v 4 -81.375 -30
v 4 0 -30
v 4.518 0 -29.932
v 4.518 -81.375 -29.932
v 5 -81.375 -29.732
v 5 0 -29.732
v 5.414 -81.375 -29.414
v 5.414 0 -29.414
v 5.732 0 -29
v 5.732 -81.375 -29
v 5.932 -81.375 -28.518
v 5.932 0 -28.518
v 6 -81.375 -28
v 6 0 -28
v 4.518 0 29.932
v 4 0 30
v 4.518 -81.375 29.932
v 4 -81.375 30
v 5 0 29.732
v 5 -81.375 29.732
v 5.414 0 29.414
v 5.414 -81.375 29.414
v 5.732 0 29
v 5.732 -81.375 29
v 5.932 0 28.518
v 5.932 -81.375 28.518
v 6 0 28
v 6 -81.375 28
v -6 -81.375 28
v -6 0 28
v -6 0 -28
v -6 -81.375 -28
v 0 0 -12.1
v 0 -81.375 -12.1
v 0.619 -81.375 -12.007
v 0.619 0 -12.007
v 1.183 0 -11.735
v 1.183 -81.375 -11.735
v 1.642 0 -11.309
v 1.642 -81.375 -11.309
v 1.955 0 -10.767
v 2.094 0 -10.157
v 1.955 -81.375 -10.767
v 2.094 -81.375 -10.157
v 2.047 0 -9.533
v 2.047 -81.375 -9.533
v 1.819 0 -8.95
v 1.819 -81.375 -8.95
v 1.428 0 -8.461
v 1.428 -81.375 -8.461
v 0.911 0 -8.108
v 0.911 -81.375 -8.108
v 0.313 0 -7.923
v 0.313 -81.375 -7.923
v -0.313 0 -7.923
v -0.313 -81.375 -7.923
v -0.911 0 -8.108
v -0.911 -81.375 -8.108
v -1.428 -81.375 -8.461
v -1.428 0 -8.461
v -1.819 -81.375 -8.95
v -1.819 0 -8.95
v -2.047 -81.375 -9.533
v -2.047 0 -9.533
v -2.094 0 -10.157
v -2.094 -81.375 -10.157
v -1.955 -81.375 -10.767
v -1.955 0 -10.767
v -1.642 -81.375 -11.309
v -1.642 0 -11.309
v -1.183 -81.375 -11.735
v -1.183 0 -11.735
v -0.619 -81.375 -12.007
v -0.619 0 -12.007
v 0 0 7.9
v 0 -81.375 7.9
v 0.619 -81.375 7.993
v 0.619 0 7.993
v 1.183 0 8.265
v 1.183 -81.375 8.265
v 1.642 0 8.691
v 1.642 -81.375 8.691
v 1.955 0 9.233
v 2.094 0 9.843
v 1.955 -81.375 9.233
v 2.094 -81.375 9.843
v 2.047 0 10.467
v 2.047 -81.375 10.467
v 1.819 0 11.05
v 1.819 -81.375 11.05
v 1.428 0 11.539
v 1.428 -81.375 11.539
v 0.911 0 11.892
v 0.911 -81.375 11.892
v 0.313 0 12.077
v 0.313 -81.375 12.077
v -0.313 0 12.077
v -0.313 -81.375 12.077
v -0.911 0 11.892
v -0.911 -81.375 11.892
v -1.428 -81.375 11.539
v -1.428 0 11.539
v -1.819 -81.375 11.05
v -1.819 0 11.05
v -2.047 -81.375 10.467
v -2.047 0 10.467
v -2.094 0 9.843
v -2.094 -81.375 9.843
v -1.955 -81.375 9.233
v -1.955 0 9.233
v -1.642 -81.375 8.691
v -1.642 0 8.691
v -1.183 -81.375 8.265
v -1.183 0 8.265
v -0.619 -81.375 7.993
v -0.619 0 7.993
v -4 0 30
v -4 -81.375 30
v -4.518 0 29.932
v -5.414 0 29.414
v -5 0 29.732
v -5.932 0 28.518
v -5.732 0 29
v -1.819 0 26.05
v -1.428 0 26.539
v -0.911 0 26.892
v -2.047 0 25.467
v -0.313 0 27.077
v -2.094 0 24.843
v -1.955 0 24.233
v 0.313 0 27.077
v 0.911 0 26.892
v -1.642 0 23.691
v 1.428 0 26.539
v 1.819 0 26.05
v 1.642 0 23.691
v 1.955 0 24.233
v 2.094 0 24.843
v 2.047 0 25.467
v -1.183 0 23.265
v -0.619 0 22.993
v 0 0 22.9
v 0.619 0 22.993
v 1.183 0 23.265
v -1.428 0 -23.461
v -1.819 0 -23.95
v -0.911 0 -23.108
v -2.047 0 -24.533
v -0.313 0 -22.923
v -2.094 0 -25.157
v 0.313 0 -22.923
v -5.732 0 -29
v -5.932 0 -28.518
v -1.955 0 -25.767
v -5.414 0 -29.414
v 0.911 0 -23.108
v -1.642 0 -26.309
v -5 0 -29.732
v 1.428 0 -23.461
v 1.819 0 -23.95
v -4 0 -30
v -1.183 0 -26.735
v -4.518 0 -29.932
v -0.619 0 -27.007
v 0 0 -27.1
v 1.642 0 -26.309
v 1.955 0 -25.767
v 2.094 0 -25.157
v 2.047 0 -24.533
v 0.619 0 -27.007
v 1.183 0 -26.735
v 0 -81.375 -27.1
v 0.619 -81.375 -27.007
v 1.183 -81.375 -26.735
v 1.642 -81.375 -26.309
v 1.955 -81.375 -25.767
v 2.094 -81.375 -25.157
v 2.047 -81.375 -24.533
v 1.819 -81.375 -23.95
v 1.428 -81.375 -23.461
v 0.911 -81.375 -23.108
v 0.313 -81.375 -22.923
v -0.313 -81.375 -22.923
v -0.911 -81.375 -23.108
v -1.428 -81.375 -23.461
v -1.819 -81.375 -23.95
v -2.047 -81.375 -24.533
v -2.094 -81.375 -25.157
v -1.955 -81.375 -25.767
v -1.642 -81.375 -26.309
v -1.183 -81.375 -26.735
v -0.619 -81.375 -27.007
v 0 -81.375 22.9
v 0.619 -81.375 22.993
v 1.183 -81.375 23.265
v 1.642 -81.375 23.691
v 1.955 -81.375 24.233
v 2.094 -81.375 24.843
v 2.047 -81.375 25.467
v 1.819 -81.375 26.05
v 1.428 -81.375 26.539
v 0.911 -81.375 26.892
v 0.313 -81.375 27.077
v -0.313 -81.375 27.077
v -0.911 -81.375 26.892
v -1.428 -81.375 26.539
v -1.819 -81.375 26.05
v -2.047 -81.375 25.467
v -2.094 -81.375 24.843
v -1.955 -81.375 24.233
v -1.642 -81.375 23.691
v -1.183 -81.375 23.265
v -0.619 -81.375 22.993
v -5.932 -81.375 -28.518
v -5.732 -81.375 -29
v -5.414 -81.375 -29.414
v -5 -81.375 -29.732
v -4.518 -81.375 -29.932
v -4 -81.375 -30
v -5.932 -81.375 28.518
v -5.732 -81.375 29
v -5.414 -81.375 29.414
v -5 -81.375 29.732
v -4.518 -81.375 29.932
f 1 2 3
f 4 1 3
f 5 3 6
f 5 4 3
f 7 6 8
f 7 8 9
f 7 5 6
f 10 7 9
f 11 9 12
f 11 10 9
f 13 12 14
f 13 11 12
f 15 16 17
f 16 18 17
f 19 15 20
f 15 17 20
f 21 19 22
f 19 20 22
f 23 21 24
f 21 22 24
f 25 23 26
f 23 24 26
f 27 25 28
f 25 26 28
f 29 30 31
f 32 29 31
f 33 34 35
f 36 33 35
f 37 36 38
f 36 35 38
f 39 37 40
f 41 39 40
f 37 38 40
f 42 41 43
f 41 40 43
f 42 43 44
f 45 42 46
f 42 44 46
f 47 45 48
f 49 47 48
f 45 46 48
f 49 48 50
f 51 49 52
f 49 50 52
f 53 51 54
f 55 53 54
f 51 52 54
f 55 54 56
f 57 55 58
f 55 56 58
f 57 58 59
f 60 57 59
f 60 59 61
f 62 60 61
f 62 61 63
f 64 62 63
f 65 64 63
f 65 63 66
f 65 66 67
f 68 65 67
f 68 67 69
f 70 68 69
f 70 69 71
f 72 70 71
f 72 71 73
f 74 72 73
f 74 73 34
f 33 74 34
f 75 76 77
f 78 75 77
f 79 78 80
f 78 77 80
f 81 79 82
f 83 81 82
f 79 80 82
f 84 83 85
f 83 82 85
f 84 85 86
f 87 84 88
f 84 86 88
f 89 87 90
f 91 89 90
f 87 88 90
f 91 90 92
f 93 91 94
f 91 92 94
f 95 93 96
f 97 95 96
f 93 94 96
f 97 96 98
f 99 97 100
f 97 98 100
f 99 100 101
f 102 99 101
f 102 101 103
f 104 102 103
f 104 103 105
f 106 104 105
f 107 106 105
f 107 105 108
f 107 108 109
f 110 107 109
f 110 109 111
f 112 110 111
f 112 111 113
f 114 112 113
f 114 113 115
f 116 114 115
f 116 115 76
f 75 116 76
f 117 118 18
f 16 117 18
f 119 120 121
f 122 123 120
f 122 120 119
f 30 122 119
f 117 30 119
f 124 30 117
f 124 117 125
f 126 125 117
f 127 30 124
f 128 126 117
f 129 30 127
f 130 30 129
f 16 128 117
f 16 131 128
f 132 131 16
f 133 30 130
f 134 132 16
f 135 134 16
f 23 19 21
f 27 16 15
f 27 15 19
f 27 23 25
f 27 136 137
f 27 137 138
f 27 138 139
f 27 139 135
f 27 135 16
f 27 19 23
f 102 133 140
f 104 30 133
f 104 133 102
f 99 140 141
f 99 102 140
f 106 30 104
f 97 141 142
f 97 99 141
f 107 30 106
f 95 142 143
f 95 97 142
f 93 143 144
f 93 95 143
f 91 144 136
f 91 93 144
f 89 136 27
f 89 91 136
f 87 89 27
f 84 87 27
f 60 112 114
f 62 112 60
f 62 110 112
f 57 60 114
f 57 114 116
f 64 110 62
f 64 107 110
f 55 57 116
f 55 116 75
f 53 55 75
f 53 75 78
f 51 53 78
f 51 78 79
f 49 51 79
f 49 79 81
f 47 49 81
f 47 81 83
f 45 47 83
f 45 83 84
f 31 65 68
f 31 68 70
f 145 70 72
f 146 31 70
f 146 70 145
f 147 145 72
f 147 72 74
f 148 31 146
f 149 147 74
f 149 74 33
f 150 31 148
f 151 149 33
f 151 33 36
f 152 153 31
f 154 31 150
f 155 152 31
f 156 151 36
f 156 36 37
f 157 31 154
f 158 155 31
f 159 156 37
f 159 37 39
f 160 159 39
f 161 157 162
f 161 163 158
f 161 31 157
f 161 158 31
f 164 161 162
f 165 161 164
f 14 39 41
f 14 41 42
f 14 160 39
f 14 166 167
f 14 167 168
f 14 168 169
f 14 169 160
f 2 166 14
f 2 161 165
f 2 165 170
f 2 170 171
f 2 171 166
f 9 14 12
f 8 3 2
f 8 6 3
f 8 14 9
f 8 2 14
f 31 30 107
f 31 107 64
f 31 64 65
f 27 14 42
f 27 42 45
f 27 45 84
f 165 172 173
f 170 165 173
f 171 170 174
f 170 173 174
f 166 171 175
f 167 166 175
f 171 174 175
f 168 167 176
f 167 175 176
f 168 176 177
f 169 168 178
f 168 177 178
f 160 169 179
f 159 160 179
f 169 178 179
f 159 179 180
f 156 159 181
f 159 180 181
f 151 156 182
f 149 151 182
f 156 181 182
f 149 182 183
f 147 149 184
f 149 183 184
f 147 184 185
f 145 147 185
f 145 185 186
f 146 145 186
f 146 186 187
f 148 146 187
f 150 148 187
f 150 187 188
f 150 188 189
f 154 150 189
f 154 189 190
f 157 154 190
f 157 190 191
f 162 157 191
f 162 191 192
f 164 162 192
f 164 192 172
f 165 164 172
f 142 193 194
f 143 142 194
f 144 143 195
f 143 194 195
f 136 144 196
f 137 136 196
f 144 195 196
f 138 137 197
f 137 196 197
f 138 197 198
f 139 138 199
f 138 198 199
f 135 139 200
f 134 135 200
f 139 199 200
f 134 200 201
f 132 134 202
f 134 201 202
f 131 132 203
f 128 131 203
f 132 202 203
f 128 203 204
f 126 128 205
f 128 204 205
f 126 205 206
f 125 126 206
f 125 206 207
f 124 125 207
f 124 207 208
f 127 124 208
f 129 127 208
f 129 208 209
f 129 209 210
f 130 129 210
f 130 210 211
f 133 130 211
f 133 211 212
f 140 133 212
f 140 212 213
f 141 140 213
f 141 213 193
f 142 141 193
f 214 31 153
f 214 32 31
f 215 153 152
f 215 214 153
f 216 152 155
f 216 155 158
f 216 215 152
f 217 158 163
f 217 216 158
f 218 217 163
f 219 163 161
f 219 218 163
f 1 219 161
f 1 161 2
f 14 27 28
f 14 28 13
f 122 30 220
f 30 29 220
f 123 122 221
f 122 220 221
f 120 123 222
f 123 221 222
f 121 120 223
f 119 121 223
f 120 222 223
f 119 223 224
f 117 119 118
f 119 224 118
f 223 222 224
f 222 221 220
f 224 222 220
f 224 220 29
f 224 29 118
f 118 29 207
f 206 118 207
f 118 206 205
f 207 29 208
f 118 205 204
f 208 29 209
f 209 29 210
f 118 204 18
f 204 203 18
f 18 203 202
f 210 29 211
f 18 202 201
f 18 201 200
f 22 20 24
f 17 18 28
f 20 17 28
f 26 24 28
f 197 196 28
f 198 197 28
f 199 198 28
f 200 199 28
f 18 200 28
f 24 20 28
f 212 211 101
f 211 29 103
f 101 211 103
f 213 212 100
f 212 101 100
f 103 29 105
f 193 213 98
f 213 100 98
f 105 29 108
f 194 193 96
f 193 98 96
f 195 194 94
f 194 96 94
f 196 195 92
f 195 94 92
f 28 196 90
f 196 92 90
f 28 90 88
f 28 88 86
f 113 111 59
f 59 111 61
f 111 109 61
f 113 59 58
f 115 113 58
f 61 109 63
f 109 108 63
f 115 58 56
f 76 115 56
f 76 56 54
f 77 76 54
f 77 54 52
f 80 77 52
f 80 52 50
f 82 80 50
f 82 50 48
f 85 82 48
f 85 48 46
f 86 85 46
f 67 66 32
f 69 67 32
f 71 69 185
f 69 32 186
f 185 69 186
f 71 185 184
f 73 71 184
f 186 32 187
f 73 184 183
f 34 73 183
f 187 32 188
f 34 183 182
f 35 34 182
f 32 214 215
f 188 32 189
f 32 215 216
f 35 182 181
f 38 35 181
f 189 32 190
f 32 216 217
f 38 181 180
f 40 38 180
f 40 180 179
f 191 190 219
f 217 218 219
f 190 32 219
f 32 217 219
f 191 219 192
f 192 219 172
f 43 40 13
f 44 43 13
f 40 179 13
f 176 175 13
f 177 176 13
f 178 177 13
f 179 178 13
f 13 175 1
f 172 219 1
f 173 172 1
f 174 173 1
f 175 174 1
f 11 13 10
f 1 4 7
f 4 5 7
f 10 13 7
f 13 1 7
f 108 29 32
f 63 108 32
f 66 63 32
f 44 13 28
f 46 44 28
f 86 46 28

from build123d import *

# Parameters (mm, degrees)
SKETCH1_W                   = 12
SKETCH1_H                   = 60
BOSS_EXTRUDE1_DEPTH         = 81.375
TAP_DRILL_FOR_M5X0_8_TAP1_D = 4.2
FILLET1_R                   = 2


with BuildPart() as part:
    # Sketch1 → Boss-Extrude1 (new body)
    with BuildSketch(Plane(origin=(0, 0, 0), x_dir=(1, 0, 0), z_dir=(0, 1, 0))):
        Rectangle(SKETCH1_W, SKETCH1_H)
    extrude(amount=-BOSS_EXTRUDE1_DEPTH)

    # Tap Drill for M5x0.8 Tap1 (through all)
    with Locations(Plane(origin=(0, 0, -10), x_dir=(0, 0, 1), z_dir=(0, 1, 0))):
        with Locations((0, 0), (20, 0), (-15, 0), (35, 0)):
            Hole(TAP_DRILL_FOR_M5X0_8_TAP1_D / 2)

    # Fillet1
    fillet1_edges = [part.edges().sort_by_distance(p)[0] for p in [
        (-6, -40.6875, -30),
        (-6, -40.6875, 30),
        (6, -40.6875, 30),
        (6, -40.6875, -30),
    ]]
    fillet(fillet1_edges, radius=FILLET1_R)


solid = part.part
